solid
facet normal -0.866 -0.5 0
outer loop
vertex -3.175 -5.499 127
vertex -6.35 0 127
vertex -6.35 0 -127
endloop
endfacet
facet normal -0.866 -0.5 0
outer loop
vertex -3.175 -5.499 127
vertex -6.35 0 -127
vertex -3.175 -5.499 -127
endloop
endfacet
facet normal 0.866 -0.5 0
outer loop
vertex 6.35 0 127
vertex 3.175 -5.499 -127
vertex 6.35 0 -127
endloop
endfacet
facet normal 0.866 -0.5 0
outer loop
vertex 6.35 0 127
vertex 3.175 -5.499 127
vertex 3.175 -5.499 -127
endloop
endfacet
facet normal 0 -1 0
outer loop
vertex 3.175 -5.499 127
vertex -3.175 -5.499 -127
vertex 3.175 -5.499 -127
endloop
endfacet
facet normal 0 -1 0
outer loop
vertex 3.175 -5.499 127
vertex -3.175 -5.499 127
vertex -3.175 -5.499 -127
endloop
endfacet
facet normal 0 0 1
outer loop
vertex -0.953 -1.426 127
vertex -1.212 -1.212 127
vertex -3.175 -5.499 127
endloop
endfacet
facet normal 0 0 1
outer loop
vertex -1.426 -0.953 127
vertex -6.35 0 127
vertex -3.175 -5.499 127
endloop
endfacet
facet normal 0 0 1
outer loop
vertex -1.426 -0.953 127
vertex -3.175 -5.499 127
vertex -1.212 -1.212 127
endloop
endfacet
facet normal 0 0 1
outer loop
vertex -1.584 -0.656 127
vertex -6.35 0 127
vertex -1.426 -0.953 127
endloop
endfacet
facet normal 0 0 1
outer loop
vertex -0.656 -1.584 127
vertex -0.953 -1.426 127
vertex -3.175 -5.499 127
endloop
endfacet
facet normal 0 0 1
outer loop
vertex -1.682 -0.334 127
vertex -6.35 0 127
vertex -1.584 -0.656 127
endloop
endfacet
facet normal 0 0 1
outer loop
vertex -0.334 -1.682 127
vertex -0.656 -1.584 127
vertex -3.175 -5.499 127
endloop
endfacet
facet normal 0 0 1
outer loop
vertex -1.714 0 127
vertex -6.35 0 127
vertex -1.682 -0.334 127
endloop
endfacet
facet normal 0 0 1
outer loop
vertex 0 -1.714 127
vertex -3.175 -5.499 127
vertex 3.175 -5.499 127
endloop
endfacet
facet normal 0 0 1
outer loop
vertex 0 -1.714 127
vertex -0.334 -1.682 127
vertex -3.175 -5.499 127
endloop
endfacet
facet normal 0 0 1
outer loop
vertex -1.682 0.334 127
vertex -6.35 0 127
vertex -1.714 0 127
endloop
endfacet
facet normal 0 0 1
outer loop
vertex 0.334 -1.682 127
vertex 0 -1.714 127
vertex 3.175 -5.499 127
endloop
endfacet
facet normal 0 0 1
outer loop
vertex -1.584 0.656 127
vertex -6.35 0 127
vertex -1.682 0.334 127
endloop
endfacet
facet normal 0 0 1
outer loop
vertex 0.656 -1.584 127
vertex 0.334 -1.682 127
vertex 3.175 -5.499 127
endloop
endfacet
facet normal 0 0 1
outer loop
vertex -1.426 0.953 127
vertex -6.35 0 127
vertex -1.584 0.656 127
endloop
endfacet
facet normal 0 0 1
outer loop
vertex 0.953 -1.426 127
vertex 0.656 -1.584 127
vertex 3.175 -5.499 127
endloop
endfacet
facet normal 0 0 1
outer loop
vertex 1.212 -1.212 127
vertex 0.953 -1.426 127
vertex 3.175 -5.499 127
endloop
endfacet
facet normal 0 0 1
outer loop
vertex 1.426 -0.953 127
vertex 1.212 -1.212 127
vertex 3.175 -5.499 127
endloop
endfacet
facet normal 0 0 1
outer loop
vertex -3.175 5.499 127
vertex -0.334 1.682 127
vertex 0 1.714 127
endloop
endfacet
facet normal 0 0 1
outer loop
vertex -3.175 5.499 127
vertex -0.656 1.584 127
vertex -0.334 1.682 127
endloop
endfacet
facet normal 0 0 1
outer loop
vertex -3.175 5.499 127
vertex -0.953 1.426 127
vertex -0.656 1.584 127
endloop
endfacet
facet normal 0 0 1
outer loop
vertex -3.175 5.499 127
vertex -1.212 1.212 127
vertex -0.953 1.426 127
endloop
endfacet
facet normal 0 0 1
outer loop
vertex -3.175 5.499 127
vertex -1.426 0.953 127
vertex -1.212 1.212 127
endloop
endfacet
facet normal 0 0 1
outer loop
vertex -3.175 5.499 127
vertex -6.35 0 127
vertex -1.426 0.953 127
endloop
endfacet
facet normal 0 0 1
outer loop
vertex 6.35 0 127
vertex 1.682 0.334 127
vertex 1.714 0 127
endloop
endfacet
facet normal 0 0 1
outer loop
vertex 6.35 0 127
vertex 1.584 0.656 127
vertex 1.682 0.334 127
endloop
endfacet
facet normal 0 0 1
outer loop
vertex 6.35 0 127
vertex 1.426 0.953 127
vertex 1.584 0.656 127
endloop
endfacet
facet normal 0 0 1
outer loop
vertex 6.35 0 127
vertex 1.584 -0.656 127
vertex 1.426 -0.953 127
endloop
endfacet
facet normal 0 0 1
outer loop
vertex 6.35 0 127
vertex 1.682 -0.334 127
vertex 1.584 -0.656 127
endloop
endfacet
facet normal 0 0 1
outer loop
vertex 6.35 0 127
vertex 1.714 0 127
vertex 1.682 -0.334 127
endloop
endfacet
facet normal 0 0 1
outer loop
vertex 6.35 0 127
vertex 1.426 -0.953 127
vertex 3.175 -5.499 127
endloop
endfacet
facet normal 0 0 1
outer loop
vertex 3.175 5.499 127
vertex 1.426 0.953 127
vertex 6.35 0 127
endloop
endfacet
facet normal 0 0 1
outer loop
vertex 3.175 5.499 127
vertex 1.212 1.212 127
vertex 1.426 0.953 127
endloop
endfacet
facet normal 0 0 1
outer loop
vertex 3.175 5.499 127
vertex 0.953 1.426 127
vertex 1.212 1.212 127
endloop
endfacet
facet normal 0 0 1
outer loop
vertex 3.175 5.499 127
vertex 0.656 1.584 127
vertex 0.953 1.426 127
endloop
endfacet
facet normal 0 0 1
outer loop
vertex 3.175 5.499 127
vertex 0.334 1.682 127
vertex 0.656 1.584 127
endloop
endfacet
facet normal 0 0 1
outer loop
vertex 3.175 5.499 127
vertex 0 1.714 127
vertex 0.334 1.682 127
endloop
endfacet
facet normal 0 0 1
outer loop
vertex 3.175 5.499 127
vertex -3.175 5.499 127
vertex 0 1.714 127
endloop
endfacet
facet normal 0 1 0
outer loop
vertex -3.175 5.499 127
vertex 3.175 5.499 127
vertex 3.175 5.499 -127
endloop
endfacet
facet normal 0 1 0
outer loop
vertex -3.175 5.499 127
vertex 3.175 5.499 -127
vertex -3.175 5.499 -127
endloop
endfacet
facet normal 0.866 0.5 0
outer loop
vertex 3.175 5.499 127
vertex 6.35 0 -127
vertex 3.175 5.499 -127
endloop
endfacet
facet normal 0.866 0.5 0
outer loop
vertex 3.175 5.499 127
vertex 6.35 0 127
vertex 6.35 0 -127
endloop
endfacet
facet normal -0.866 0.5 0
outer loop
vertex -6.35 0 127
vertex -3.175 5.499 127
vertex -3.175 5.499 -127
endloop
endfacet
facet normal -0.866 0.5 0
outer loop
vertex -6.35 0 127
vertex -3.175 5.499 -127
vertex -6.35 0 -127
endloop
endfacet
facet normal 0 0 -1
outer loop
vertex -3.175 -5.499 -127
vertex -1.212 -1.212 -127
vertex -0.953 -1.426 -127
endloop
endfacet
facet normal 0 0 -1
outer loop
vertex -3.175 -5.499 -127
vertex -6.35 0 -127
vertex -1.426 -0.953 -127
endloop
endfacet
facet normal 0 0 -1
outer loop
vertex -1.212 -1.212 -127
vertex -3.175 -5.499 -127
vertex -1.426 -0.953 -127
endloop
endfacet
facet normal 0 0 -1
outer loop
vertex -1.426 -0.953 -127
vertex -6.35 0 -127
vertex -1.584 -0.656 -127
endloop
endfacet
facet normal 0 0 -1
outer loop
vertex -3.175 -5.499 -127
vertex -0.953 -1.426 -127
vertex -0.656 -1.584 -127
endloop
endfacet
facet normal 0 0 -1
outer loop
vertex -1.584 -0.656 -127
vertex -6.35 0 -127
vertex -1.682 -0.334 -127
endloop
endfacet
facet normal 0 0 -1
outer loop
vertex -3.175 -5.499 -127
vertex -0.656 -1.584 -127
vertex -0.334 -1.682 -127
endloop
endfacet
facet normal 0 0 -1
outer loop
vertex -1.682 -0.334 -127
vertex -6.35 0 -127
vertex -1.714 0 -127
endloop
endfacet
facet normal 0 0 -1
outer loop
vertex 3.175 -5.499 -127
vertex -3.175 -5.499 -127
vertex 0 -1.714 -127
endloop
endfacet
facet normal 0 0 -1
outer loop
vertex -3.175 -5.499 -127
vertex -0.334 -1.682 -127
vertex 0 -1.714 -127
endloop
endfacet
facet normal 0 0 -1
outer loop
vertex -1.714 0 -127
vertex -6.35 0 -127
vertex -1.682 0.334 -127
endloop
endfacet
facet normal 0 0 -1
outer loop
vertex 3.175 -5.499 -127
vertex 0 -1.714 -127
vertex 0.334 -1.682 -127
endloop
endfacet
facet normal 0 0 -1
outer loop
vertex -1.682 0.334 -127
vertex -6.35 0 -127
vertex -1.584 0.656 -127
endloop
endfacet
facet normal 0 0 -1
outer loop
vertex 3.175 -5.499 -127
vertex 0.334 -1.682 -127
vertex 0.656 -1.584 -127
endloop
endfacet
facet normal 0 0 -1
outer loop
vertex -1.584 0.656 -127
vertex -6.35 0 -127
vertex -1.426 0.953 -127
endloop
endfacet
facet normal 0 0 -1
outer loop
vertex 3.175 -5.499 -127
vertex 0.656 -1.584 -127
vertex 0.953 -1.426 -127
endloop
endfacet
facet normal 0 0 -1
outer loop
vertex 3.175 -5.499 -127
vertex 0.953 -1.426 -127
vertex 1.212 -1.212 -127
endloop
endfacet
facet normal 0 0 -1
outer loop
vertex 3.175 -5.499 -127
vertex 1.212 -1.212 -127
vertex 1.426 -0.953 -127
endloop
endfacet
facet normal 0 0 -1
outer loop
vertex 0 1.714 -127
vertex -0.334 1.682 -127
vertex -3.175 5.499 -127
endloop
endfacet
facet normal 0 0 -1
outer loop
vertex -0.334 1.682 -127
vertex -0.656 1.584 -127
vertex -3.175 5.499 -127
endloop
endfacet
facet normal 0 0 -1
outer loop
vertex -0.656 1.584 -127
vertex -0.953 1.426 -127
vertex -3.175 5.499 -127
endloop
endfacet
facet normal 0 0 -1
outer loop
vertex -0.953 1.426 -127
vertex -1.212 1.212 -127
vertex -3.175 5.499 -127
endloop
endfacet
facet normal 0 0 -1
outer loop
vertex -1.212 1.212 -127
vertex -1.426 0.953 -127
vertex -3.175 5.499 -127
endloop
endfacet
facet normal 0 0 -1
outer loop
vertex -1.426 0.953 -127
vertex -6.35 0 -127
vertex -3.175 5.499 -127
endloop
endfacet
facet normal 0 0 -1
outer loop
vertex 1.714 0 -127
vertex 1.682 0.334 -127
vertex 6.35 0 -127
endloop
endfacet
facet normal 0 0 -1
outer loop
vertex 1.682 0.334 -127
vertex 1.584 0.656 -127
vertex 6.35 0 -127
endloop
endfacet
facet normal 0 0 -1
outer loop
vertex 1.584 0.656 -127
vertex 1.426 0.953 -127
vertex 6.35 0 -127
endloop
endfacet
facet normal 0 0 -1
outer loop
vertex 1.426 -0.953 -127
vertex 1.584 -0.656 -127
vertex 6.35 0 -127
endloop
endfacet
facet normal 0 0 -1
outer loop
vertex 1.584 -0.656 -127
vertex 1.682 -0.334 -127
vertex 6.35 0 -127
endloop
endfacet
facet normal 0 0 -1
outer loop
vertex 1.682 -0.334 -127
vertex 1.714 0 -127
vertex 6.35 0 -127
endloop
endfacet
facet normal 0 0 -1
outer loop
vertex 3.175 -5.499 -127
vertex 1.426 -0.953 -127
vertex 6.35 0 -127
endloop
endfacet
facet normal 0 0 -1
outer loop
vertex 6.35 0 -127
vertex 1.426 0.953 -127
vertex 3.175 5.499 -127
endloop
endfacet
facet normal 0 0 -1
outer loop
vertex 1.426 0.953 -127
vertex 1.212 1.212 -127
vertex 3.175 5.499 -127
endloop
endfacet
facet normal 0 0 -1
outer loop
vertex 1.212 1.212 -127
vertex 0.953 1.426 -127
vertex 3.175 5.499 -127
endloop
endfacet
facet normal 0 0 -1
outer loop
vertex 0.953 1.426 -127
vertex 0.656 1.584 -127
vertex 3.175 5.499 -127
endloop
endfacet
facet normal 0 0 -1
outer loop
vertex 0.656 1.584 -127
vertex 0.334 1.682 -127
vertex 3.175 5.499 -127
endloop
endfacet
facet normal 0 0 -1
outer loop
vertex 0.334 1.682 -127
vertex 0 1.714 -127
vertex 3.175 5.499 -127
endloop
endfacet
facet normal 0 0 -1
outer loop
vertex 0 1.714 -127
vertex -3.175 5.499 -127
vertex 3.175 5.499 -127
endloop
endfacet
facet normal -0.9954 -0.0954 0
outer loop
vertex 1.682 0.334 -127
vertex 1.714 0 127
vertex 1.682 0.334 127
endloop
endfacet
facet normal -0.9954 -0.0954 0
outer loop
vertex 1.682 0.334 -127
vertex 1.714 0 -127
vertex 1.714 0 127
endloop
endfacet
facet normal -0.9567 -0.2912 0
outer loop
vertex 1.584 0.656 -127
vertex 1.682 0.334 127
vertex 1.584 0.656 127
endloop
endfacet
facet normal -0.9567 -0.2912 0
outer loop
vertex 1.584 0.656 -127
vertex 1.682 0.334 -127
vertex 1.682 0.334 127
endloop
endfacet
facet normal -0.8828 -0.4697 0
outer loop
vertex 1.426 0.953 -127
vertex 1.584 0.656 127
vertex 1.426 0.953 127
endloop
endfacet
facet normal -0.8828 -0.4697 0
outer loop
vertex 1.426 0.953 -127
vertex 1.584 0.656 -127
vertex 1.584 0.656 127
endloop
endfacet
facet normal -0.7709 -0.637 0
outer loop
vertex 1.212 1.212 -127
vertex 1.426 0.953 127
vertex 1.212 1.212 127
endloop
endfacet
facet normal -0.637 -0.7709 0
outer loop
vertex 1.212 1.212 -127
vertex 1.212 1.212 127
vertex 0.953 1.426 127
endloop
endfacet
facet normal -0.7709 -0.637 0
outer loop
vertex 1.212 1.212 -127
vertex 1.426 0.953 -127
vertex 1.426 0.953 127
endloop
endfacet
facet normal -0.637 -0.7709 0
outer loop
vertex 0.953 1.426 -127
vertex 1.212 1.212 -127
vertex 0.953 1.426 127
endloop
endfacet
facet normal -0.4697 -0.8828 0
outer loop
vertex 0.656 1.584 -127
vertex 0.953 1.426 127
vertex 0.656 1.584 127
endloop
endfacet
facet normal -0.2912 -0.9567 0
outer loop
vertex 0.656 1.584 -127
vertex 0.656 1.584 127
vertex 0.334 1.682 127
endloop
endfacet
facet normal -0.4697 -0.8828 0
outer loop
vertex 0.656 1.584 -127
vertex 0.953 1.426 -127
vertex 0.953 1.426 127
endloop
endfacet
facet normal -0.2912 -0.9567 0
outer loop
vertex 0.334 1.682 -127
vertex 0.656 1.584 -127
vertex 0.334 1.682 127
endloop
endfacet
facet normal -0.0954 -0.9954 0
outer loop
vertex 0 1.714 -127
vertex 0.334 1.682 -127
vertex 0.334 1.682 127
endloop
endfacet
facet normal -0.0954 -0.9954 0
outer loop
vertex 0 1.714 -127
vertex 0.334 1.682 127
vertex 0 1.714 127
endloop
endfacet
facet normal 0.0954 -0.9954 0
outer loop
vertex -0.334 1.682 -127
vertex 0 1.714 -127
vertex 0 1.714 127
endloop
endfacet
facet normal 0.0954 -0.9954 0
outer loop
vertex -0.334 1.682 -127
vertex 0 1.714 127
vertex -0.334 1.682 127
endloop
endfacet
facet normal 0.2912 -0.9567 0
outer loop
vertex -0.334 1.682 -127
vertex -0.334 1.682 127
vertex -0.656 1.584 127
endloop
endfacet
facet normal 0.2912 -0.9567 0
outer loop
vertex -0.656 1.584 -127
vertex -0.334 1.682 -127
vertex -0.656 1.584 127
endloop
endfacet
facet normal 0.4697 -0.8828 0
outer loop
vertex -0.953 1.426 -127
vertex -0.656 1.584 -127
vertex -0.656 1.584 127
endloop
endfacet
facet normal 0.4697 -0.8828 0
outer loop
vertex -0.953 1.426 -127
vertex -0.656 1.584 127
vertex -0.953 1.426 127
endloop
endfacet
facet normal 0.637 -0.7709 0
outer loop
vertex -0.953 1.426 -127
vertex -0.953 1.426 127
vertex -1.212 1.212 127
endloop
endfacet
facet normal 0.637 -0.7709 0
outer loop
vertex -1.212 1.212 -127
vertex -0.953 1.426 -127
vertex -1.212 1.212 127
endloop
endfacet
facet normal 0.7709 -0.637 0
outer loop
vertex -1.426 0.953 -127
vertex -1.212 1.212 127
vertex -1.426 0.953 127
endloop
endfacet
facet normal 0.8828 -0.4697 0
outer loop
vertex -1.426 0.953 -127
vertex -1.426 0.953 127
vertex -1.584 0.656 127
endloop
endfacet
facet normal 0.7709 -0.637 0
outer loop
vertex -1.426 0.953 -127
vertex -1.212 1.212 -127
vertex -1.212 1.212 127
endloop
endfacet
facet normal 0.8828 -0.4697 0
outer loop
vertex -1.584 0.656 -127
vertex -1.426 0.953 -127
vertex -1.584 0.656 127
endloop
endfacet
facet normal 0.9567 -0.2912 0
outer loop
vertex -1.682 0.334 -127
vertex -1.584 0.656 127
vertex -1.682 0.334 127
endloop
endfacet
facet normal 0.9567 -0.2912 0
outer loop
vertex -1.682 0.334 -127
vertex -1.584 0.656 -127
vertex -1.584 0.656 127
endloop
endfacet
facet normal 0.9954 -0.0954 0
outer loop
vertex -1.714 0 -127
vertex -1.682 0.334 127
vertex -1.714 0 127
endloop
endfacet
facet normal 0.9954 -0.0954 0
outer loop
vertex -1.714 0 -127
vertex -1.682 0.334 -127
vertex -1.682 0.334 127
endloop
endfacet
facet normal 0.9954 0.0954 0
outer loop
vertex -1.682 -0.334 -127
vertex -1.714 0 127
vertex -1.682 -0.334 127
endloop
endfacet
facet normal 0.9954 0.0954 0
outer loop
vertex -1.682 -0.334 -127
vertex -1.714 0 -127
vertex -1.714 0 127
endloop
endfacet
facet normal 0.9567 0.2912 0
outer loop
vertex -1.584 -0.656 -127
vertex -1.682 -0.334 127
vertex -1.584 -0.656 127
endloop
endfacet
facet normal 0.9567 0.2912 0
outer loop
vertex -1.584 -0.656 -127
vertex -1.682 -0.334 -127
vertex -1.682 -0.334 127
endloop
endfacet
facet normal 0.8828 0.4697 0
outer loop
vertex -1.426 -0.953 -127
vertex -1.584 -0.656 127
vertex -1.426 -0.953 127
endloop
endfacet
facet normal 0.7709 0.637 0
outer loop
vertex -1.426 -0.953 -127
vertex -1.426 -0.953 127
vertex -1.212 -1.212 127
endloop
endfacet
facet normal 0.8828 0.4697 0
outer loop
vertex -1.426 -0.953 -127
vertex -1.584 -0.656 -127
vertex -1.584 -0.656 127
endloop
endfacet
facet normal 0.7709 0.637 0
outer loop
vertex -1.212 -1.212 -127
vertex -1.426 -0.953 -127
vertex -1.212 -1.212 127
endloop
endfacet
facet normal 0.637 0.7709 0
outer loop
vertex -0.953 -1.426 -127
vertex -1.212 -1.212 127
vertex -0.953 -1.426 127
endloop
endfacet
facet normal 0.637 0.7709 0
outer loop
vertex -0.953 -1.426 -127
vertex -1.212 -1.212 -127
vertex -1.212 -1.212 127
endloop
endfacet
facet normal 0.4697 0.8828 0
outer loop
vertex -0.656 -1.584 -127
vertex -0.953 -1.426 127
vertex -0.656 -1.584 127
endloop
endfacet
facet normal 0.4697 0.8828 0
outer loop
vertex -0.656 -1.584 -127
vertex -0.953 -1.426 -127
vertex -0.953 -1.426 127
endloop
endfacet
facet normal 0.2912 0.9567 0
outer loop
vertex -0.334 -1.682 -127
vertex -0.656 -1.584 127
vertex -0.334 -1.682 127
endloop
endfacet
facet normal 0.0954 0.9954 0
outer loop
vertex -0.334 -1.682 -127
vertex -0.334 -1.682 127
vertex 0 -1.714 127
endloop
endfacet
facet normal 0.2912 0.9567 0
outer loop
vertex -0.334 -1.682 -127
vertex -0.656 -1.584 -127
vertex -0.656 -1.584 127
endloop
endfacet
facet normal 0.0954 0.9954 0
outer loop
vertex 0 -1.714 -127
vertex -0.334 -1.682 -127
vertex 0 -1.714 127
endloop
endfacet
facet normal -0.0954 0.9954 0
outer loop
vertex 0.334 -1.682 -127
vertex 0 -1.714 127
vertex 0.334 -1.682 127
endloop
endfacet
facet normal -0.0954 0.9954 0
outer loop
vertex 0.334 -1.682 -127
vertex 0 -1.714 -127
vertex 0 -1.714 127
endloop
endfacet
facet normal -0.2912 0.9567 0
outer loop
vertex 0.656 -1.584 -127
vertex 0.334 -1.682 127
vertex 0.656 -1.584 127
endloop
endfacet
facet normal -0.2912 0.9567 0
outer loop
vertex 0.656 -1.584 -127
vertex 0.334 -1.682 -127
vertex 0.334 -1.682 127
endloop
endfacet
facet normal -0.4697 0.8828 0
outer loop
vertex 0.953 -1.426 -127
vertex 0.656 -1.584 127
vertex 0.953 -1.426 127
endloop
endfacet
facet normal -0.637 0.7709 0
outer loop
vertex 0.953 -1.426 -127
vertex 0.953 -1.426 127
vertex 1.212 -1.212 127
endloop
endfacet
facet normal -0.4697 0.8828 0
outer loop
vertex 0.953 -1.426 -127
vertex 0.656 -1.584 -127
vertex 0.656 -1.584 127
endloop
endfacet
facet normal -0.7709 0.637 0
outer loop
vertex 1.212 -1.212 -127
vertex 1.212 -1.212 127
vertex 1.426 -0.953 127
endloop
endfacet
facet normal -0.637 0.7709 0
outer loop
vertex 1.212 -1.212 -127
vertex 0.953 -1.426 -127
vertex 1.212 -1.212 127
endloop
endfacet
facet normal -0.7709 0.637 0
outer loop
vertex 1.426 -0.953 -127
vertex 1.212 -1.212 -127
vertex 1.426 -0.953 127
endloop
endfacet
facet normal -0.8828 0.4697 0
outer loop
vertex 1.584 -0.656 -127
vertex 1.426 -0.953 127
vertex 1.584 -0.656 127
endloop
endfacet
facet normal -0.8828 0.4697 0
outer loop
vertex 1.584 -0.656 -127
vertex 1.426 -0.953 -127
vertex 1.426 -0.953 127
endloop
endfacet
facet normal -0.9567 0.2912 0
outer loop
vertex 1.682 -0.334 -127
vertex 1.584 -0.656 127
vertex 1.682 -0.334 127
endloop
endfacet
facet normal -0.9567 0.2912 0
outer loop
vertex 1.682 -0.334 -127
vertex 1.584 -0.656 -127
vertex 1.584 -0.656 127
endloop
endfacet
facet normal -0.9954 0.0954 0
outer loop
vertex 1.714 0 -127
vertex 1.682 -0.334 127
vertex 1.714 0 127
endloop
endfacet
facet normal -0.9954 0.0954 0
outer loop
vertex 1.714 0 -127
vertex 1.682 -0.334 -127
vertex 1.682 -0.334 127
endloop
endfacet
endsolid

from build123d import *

# Parameters (mm, degrees)
SKETCH1_R           = 1.7145
BOSS_EXTRUDE1_DEPTH = 127


with BuildPart() as part:
    # Sketch1 → Boss-Extrude1 (new, symmetric)
    with BuildSketch(Plane.XY):
        Polygon((6.35, 0), (3.175, 5.499261314), (-3.175, 5.499261314), (-6.35, 0), (-3.175, -5.499261314), (3.175, -5.499261314), align=None)
        Circle(SKETCH1_R, mode=Mode.SUBTRACT)
    extrude(amount=BOSS_EXTRUDE1_DEPTH, both=True)


solid = part.part
